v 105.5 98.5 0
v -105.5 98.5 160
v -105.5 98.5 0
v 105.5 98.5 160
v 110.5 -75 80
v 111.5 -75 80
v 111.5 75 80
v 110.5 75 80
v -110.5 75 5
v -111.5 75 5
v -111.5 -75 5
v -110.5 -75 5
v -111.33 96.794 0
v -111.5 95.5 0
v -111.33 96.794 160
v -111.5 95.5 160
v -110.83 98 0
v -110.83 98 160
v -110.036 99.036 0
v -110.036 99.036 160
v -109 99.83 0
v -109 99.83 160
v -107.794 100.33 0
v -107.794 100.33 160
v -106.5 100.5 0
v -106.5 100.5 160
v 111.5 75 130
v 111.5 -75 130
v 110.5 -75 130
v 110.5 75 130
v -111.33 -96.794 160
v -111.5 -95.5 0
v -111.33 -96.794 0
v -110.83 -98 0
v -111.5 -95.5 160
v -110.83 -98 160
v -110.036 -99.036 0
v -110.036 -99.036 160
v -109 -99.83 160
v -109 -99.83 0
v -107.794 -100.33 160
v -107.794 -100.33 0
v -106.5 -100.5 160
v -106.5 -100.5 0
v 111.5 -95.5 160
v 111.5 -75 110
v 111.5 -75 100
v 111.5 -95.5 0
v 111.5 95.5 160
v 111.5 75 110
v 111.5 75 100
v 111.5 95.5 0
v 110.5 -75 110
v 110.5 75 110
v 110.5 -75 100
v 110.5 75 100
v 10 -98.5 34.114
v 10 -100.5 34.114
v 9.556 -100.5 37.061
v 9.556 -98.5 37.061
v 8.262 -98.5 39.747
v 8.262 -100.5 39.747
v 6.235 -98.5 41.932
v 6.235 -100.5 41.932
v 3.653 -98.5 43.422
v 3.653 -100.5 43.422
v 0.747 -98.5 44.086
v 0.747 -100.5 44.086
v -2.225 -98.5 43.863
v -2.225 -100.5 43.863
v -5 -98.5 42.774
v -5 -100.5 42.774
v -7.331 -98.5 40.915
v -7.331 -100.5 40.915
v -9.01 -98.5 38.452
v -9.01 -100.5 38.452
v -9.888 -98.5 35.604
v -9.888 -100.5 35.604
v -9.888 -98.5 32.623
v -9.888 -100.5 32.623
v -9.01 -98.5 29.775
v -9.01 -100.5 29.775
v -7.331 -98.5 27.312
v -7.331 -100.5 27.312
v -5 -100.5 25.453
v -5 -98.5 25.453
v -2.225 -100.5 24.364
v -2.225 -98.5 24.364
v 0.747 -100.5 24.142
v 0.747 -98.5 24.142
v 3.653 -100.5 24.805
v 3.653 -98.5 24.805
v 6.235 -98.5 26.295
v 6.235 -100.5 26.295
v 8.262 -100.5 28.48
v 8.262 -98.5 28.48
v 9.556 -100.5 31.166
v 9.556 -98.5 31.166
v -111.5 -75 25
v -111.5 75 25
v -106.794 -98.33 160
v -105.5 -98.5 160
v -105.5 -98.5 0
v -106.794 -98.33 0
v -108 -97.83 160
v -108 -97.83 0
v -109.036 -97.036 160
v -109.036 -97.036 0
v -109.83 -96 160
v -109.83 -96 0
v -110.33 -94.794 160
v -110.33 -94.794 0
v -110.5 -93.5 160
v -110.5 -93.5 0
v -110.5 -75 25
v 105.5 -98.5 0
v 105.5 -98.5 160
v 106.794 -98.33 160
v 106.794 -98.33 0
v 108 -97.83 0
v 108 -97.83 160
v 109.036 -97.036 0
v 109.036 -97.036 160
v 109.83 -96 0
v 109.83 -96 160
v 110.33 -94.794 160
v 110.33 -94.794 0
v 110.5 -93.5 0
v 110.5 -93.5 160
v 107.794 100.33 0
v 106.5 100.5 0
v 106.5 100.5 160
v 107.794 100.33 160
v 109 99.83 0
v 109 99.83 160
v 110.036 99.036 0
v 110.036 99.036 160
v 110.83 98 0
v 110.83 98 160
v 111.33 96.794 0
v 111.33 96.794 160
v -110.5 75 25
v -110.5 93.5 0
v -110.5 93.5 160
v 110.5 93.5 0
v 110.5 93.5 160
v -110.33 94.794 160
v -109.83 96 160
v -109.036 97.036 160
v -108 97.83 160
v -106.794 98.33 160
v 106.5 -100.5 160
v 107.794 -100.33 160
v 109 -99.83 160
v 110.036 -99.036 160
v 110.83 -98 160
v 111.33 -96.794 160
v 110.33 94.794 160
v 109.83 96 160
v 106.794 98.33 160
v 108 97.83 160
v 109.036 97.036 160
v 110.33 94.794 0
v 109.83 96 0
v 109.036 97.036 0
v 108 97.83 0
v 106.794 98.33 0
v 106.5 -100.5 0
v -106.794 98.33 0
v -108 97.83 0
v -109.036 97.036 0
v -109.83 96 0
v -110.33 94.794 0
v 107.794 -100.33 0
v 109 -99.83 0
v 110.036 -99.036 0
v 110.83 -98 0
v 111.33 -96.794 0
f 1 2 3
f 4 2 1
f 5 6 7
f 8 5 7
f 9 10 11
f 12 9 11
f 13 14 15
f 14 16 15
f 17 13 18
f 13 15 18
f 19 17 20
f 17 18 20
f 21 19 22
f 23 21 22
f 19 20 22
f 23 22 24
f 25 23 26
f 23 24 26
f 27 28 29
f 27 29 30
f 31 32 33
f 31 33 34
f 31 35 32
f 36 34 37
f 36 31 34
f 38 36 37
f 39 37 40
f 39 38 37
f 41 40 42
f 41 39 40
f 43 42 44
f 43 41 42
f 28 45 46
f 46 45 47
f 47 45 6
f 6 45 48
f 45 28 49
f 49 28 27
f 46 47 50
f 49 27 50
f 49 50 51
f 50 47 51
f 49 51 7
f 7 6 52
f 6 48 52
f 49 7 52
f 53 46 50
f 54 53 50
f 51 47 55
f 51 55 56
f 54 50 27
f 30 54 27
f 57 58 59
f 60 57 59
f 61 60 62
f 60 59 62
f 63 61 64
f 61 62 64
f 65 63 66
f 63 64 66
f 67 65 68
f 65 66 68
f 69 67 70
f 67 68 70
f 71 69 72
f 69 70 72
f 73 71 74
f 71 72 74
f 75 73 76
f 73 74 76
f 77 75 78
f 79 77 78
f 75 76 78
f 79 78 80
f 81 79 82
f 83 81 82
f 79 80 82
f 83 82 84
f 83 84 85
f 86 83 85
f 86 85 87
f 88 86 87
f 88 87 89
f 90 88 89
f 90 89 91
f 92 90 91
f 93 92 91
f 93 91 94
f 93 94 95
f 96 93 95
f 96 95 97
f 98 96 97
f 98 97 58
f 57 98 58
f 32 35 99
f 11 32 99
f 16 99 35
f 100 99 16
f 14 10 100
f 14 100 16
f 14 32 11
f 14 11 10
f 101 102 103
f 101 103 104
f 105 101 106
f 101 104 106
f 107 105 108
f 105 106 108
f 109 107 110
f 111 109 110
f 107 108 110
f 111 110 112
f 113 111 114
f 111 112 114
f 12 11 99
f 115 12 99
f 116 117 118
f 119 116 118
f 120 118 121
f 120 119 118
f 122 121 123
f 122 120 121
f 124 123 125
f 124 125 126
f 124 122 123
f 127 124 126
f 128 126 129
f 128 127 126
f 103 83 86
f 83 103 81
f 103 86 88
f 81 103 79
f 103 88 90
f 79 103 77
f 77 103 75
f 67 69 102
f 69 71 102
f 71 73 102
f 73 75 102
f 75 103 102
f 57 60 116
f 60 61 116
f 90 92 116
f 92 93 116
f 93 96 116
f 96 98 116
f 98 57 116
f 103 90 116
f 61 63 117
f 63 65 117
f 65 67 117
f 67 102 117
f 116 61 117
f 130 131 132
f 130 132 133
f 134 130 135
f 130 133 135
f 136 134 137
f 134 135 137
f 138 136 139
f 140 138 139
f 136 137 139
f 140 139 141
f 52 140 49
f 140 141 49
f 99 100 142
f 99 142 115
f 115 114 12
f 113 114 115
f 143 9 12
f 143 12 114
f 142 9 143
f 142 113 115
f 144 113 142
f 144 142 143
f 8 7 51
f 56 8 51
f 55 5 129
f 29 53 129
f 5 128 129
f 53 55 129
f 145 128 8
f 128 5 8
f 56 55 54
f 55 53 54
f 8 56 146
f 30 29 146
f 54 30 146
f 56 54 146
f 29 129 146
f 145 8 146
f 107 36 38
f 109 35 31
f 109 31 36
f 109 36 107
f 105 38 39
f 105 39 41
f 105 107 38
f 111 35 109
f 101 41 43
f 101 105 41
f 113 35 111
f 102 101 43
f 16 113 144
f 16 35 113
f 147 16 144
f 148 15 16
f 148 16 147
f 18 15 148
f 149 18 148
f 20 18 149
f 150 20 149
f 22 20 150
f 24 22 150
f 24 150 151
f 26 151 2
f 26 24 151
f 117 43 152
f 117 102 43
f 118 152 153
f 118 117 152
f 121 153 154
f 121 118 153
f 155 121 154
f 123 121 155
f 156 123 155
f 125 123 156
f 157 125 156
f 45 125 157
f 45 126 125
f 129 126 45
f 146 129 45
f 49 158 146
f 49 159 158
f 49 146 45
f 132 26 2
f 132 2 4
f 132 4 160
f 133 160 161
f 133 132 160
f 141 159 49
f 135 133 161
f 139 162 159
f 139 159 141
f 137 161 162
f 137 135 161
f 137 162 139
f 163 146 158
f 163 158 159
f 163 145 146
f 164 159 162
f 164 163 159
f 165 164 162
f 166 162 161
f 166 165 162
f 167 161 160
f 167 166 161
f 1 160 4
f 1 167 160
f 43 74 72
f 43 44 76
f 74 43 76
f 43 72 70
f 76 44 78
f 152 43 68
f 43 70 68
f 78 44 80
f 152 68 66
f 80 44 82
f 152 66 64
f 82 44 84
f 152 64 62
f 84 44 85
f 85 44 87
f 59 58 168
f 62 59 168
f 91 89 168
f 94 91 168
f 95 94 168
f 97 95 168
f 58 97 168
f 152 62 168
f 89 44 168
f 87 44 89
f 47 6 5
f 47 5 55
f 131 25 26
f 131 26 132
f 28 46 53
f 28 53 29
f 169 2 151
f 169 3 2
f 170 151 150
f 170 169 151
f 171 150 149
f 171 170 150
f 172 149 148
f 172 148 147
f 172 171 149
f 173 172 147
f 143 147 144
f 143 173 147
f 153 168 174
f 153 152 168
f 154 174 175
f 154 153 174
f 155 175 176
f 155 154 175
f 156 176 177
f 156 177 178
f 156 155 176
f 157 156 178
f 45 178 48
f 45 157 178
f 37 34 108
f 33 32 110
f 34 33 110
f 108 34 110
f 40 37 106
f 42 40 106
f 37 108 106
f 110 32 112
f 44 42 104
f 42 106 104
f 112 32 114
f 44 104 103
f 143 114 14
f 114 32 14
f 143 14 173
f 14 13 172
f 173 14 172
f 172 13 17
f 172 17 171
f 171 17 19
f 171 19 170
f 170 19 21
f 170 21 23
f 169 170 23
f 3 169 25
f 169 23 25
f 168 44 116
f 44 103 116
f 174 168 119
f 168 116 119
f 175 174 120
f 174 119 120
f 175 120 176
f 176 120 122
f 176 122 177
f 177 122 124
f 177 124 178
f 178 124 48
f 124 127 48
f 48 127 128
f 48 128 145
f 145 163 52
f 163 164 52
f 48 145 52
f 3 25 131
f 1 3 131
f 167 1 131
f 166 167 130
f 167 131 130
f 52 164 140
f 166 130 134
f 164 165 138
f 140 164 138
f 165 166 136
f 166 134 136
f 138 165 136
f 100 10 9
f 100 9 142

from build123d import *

# Parameters (mm, degrees)
F0_W     = 223
F0_H     = 201
F1_DEPTH = 160
F2_W     = 221
F2_H     = 197
F3_DEPTH = 160
F4_W     = 150
F4_H     = 20
F5_DEPTH = 25
F6_W     = 150
F6_H     = 20
F7_DEPTH = 25
F8_R     = 10
F9_DEPTH = 25
F10_R    = 5


with BuildPart() as f1:
    # F0 (on Top) → F1 (new body)
    with BuildSketch(Plane.XY):
        Rectangle(F0_W, F0_H)
    extrude(amount=F1_DEPTH)

    # F2 (on face) → F3 (cut)
    with BuildSketch(Plane.XY.offset(160)):
        Rectangle(F2_W, F2_H)
    extrude(amount=-F3_DEPTH, mode=Mode.SUBTRACT)

    # F4 (on face) → F5 (cut)
    with BuildSketch(Plane.YZ.offset(111.5)):
        with Locations((0, 120)):
            Rectangle(F4_W, F4_H)
        with Locations((0, 90)):
            Rectangle(F4_W, F4_H)
    extrude(amount=-F5_DEPTH, mode=Mode.SUBTRACT)

    # F6 (on face) → F7 (cut)
    with BuildSketch(Plane(origin=(-111.5, 0, 0), x_dir=(0, -1, 0), z_dir=(-1, 0, 0))):
        with Locations((0, 15)):
            Rectangle(F6_W, F6_H)
    extrude(amount=-F7_DEPTH, mode=Mode.SUBTRACT)

    # F8 (on face) → F9 (cut)
    with BuildSketch(Plane.XZ.offset(100.5)):
        with Locations((0, 34.113634)):
            Circle(F8_R)
    extrude(amount=-F9_DEPTH, mode=Mode.SUBTRACT)

    # F10
    f10_edges = [f1.edges().sort_by_distance(p)[0] for p in [
        (-110.5, -98.5, 80),
        (-111.5, -100.5, 80),
        (-111.5, 100.5, 80),
        (-110.5, 98.5, 80),
        (110.5, 98.5, 80),
        (110.5, -98.5, 80),
        (111.5, 100.5, 80),
        (111.5, -100.5, 80),
    ]]
    fillet(f10_edges, radius=F10_R)


solid = f1.part
